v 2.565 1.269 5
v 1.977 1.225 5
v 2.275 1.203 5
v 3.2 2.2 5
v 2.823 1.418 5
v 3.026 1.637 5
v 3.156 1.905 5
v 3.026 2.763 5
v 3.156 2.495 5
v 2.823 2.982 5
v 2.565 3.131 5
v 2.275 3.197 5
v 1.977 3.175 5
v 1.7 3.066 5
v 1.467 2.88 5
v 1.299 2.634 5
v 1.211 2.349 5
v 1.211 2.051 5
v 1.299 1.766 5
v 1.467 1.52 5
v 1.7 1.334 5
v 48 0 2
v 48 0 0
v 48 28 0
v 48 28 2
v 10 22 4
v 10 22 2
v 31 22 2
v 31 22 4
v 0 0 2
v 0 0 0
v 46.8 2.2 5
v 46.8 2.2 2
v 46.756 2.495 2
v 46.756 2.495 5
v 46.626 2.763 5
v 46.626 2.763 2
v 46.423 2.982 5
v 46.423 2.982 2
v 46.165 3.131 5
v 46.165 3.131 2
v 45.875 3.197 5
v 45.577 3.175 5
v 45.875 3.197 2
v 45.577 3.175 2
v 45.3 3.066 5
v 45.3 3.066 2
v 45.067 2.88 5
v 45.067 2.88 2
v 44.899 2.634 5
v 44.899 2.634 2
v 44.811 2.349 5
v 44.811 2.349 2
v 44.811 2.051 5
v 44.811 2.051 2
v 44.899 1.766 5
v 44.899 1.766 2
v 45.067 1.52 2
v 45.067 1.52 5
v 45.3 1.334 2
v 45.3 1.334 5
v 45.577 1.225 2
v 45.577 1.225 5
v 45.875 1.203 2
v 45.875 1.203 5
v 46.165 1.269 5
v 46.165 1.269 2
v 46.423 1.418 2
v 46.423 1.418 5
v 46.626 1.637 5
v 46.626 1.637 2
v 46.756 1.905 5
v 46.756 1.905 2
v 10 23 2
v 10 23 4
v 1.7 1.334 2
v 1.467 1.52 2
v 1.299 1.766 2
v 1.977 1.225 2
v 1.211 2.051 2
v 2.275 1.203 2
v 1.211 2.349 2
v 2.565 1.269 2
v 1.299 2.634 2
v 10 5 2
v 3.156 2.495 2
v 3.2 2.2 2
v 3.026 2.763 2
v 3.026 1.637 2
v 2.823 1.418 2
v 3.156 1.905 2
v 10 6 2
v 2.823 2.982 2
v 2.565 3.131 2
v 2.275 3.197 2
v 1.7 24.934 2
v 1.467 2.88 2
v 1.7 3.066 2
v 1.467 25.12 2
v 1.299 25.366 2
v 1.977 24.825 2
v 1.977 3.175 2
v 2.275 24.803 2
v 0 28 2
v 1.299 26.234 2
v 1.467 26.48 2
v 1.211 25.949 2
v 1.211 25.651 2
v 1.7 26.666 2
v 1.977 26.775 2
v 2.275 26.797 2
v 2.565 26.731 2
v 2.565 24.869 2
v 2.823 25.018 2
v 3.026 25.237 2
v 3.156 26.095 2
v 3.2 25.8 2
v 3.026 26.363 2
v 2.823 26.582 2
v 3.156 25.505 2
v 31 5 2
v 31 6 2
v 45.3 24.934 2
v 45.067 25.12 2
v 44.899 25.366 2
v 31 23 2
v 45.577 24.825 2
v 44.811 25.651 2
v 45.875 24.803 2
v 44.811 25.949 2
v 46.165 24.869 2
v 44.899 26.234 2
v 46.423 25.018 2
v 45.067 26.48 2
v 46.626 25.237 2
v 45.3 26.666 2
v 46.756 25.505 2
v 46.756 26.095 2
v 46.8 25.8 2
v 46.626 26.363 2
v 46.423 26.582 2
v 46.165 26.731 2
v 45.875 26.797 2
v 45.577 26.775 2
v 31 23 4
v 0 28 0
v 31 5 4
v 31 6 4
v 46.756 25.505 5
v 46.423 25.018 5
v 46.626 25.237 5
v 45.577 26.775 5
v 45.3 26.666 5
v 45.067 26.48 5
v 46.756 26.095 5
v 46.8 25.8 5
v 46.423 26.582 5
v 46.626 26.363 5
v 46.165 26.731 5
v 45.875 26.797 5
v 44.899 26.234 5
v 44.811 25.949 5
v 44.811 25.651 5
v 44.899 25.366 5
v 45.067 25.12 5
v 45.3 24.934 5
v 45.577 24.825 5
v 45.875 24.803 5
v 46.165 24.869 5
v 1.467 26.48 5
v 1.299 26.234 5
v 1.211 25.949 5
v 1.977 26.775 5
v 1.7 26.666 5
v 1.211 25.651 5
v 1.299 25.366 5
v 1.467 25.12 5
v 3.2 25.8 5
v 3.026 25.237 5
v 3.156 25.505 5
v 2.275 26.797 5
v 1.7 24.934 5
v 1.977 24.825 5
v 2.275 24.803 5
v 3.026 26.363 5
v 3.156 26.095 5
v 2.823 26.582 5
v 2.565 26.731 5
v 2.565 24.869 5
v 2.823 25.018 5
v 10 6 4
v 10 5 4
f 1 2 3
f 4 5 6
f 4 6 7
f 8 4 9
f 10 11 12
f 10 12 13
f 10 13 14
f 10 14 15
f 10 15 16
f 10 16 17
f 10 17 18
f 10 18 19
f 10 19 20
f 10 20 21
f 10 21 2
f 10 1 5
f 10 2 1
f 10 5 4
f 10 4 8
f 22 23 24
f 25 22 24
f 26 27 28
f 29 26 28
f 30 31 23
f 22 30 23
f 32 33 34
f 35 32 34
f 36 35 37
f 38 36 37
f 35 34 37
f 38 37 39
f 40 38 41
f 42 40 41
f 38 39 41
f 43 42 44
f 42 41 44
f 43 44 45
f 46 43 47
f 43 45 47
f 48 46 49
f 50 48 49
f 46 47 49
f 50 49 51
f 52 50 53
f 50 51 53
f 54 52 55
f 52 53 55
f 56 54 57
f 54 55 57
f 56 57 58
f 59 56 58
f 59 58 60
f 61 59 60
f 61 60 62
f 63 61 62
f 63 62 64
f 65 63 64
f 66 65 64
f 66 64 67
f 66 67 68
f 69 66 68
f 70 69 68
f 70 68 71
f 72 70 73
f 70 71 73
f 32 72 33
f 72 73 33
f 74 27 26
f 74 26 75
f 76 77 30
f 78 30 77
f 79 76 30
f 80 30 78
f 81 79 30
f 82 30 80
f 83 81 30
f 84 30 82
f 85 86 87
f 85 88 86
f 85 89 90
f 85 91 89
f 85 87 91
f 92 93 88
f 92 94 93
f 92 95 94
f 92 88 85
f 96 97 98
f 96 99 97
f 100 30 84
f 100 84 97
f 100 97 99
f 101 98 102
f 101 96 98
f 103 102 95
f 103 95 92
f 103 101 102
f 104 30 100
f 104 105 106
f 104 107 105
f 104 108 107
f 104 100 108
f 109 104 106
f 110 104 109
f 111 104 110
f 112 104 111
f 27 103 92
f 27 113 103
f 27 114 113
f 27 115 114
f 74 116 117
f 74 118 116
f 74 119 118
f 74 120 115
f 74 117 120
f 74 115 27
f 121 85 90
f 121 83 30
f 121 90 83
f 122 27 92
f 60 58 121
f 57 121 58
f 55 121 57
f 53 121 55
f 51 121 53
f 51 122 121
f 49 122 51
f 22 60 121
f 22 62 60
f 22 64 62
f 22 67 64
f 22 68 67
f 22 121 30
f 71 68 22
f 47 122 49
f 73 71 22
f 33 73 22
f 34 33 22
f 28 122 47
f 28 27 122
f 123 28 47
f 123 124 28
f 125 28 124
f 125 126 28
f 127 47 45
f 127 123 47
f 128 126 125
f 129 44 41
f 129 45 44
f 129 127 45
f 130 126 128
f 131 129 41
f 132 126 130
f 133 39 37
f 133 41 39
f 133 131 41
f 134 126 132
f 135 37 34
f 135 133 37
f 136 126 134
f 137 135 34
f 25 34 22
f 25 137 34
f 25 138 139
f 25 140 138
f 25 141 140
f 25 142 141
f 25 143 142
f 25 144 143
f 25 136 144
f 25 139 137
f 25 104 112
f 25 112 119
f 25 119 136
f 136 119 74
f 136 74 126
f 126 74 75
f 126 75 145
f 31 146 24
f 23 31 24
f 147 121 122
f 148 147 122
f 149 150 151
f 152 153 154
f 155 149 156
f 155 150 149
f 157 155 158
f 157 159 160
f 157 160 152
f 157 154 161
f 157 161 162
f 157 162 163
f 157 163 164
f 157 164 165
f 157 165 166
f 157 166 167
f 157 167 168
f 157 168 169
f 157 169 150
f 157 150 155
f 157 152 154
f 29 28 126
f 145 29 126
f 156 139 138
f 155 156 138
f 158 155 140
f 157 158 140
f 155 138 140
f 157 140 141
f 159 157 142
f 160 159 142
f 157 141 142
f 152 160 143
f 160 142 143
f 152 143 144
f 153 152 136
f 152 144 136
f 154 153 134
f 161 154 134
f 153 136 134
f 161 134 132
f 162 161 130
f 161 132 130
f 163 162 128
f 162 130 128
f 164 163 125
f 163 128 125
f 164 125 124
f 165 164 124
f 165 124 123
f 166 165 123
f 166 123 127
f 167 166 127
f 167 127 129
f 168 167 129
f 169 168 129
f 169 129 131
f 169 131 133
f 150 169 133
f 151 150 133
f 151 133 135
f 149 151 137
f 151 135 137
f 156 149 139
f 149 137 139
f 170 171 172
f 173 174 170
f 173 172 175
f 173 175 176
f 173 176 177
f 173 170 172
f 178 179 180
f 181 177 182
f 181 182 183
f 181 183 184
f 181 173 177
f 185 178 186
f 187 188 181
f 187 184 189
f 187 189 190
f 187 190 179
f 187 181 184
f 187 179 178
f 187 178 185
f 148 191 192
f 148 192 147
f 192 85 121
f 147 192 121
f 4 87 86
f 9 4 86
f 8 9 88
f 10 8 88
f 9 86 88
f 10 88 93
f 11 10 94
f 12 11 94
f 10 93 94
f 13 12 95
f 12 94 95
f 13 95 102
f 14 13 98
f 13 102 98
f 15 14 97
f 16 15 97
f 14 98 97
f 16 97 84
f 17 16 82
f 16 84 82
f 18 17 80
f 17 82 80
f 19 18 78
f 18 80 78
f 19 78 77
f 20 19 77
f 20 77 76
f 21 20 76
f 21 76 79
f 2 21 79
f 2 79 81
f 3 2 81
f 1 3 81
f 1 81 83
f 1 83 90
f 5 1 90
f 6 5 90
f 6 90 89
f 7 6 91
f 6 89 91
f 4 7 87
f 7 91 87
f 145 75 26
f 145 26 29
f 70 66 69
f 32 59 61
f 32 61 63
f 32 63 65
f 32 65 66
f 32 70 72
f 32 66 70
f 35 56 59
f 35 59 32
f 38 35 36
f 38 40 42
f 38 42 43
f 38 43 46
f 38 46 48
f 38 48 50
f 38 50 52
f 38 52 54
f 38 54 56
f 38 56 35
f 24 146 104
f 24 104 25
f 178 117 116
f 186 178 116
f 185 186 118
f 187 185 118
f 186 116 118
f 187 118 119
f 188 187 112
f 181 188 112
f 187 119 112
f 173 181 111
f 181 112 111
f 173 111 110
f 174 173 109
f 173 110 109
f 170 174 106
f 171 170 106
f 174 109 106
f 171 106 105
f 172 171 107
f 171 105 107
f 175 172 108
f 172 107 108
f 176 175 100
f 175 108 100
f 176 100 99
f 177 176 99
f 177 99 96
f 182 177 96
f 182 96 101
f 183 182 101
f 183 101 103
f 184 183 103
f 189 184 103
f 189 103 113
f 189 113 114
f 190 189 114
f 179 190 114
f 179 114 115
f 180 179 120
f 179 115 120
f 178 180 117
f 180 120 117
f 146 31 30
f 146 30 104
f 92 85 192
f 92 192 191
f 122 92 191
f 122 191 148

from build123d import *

# Parameters (mm, degrees)
SKETCH_W     = 48
SKETCH_H     = 28
PAD_DEPTH    = 2
SKETCH001_R  = 1
PAD001_DEPTH = 3
SKETCH002_W  = 21
SKETCH002_H  = 1
PAD002_DEPTH = 2


with BuildPart() as part:
    # Sketch → Pad (new body)
    with BuildSketch(Plane.XY):
        with Locations((24, 14)):
            Rectangle(SKETCH_W, SKETCH_H)
    extrude(amount=PAD_DEPTH)

    # Sketch001 → Pad001 (new body)
    with BuildSketch(Plane.XY.offset(2)):
        with Locations((2.2, 2.2)):
            Circle(SKETCH001_R)
        with Locations((2.2, 25.8)):
            Circle(SKETCH001_R)
        with Locations((45.8, 25.8)):
            Circle(SKETCH001_R)
        with Locations((45.8, 2.2)):
            Circle(SKETCH001_R)
    extrude(amount=PAD001_DEPTH)

    # Sketch002 → Pad002 (new body)
    with BuildSketch(Plane.XY.offset(2)):
        with Locations((20.5, 22.5)):
            Rectangle(SKETCH002_W, SKETCH002_H)
        with Locations((20.5, 5.5)):
            Rectangle(SKETCH002_W, SKETCH002_H)
    extrude(amount=PAD002_DEPTH)


solid = part.part
